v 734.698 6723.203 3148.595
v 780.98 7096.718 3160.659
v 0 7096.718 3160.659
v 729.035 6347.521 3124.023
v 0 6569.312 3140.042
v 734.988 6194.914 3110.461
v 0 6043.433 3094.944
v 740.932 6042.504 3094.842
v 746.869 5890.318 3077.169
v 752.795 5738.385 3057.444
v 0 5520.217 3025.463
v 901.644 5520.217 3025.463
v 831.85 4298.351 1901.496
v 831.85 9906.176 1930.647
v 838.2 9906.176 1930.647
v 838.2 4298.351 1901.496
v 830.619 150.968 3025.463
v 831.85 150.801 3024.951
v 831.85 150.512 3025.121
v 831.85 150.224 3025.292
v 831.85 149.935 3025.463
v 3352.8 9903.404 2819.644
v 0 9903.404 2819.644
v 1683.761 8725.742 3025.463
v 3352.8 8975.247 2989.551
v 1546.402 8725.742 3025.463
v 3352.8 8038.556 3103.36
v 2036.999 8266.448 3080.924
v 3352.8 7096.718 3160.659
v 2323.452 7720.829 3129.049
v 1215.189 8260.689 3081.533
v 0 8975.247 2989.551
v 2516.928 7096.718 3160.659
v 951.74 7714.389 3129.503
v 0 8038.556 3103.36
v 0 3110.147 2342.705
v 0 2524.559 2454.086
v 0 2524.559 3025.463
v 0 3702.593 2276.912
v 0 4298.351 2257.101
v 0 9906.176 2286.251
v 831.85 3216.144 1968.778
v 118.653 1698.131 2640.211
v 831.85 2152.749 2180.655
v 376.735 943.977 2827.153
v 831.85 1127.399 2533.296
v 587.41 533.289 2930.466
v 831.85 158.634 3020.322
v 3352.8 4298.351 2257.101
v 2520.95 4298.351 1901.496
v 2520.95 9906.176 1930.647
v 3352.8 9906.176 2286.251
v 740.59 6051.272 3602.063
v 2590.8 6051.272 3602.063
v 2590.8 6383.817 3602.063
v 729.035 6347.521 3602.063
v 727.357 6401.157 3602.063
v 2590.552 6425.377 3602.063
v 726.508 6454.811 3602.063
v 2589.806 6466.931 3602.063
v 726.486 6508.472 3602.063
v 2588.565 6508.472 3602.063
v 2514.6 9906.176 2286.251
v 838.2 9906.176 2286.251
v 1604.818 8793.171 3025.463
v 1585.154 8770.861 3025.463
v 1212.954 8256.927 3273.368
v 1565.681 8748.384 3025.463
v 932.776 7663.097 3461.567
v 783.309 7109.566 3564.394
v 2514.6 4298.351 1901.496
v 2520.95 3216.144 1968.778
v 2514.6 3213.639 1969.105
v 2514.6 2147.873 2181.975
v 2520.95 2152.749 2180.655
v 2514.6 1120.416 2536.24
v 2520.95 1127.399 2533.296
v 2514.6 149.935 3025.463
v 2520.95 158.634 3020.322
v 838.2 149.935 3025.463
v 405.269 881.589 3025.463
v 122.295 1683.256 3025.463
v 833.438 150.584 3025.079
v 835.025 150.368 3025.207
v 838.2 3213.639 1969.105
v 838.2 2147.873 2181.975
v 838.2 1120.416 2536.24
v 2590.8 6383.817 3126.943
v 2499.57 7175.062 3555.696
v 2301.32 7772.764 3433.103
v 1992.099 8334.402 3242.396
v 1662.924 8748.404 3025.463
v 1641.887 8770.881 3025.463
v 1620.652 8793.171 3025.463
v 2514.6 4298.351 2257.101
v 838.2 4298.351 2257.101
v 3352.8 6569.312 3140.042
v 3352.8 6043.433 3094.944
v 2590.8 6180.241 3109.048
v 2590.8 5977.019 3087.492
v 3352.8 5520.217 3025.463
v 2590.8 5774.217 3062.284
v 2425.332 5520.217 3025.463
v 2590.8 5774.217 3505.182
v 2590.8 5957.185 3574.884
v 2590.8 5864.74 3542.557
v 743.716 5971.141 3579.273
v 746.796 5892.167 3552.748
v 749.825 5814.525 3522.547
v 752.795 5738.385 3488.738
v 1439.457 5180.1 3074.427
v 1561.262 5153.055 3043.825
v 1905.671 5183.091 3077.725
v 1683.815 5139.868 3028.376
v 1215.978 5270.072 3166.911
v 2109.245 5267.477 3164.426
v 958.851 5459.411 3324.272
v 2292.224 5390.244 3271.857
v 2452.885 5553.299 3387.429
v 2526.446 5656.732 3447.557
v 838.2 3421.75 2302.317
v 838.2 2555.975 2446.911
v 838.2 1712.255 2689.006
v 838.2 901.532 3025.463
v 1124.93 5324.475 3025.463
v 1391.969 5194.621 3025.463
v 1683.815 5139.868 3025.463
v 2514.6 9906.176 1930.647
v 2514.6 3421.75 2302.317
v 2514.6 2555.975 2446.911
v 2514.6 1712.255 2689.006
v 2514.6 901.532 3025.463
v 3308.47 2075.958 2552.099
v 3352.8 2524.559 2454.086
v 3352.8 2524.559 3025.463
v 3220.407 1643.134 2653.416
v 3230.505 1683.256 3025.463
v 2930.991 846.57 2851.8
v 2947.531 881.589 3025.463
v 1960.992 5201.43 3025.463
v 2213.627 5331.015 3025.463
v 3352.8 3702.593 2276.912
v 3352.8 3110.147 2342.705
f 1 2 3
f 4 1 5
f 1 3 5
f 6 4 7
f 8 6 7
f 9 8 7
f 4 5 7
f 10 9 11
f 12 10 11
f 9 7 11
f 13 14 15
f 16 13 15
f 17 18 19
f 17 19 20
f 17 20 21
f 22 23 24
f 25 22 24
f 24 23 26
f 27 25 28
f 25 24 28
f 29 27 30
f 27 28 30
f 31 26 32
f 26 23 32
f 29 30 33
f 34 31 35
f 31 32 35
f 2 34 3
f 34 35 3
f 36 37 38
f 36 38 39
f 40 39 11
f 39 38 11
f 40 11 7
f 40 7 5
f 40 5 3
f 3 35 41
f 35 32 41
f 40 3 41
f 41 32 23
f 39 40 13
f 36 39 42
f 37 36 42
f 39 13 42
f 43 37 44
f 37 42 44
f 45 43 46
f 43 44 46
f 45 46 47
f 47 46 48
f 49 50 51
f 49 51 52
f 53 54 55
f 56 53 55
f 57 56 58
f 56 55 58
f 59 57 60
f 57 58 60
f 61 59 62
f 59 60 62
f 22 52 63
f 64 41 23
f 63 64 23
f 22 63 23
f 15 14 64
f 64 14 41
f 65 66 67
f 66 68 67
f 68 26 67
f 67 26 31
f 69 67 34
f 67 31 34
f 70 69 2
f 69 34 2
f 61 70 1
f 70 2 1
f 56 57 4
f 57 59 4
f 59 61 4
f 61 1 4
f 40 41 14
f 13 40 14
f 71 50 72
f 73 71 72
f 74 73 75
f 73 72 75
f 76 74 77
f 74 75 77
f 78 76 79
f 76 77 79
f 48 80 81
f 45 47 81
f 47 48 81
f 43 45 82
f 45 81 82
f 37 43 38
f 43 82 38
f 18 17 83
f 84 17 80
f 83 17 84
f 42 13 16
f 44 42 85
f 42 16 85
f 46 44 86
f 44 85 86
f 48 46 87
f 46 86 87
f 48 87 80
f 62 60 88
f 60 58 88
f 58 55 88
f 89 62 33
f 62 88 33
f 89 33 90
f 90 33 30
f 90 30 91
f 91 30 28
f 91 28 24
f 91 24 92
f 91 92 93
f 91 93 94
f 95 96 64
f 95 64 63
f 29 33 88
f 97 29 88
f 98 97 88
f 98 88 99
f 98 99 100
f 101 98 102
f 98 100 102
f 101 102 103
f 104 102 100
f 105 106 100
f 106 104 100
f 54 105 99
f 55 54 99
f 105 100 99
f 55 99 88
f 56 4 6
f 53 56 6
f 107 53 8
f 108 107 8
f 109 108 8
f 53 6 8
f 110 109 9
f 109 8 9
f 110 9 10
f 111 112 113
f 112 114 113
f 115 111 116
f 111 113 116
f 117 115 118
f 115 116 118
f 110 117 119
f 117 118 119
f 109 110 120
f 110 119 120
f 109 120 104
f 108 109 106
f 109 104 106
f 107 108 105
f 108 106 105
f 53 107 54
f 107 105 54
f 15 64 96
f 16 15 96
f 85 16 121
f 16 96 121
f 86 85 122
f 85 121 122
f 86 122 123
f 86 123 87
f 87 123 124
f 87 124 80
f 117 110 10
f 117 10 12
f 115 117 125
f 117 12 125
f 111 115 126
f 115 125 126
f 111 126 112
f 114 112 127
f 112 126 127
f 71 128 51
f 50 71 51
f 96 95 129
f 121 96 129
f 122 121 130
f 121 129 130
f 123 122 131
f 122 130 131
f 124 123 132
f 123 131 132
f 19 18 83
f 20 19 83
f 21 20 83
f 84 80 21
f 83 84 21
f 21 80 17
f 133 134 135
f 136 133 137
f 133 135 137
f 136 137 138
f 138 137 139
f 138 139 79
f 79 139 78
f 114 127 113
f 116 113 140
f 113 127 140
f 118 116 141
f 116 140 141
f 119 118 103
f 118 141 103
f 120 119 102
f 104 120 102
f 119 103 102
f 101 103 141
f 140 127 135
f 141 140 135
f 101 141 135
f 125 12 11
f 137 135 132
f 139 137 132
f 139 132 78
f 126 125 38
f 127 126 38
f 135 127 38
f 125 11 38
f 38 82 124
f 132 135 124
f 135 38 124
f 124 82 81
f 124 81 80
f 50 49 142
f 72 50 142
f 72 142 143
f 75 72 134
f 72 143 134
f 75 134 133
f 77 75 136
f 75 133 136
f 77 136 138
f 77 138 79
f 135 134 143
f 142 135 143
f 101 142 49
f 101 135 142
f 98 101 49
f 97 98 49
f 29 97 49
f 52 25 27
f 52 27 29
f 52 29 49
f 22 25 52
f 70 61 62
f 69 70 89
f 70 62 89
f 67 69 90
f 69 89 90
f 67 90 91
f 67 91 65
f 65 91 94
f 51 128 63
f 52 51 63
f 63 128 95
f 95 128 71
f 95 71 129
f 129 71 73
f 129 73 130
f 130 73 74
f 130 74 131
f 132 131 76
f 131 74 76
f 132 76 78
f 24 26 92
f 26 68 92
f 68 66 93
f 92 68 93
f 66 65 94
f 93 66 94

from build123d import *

# Parameters (mm, degrees)
F1_DEPTH  = 3352.8
F3_DEPTH  = 914.4
F5_DEPTH  = 3352.8
F7_W      = 1676.4
F7_H      = 187.770880038
F7_H_2    = 355.604804315
F10_DEPTH = 1320.8


with BuildPart() as f1:
    # F0 (on Right) → F1 (new body)
    with BuildSketch(Plane.YZ):
        with BuildLine():
            Line((9906.1763013826, 2286.2513795817), (9903.4036295408, 2819.6441732065))
            ThreePointArc((9903.4036295408, 2819.6441732065), (8507.7575621146, 3053.498500359), (7096.718104665, 3160.6593204871))
            ThreePointArc((7096.718104665, 3160.6593204871), (6306.1105449526, 3120.5478052313), (5520.2173816261, 3025.4626698664))
            Line((5520.2173816261, 3025.4626698664), (149.9354032589, 3025.4626698664))
            ThreePointArc((149.9354032589, 3025.4626698664), (2186.9166194611, 2445.3700036504), (4296.5021474202, 2257.0912826433))
            Line((4296.5021474202, 2257.0912826433), (9906.1763013826, 2286.2513795817))
        make_face()
        with BuildLine():
            Line((9906.1763013826, 1930.6465752666), (9906.1763013826, 2286.2513795817))
            Line((9906.1763013826, 2286.2513795817), (4296.5021474202, 2257.0912826433))
            ThreePointArc((4296.5021474202, 2257.0912826433), (2186.9166194611, 2445.3700036504), (149.9354032589, 3025.4626698664))
            ThreePointArc((149.9354032589, 3025.4626698664), (2147.8725687033, 2181.9750901472), (4298.3505953147, 1901.4960868935))
            Line((4298.3505953147, 1901.4960868935), (9906.1763013826, 1930.6465752666))
        make_face()
    extrude(amount=F1_DEPTH)

    # F2 (on face) → F3 (join)
    with BuildSketch(Plane.XY.offset(3025.4626698664)):
        with BuildLine():
            ThreePointArc((1683.8150913295, 5139.8680466252), (2221.5916744575, 5336.534299223), (2590.8, 5774.2173816261))
            Line((2590.8, 5774.2173816261), (2590.8, 6383.8173816261))
            ThreePointArc((2590.8, 6383.8173816261), (2336.9387512428, 7687.9813910632), (1612.4259228504, 8801.700592041))
            ThreePointArc((1612.4259228504, 8801.700592041), (931.872095069, 7660.5889477995), (729.0350215534, 6347.5213871845))
            Line((729.0350215534, 6347.5213871845), (752.7948753911, 5738.3845968446))
            ThreePointArc((752.7948753911, 5738.3845968446), (1138.7818511996, 5315.4244063088), (1683.8150913295, 5139.8680466252))
        make_face()
    extrude(amount=F3_DEPTH)

    # F4 (on face) → F5 (cut)
    with BuildSketch(Plane.YZ.offset(3352.8)):
        with BuildLine():
            ThreePointArc((5137.4154090881, 3025.4626698664), (5549.4088046364, 3384.9807891534), (6051.2724639455, 3602.0630397775))
            Line((6051.2724639455, 3602.0630397775), (6508.4724639455, 3602.0630397775))
            ThreePointArc((6508.4724639455, 3602.0630397775), (7699.4079318865, 3452.4470342276), (8816.3271482832, 3012.8976036053))
            Line((8816.3271482832, 3012.8976036053), (8976.5672683716, 4052.9136657715))
            Line((8976.5672683716, 4052.9136657715), (5137.4154090881, 4052.9136657715))
            Line((5137.4154090881, 4052.9136657715), (5137.4154090881, 3025.4626698664))
        make_face()
    extrude(amount=-F5_DEPTH, mode=Mode.SUBTRACT)

    # F8: sweep along a path in F8_path
    with BuildLine(Plane(origin=(3352.8, 9906.1763013826, 1930.6465752666), x_dir=(0, 0, 1), z_dir=(1, 0, 0))) as f8_path:
        Line((0, 0), (-29.1504883732, 5607.8257060679))
        ThreePointArc((-29.1504883732, 5607.8257060679), (251.3285148806, 7758.3037326792), (1094.8160945997, 9756.2408981237))
    # F7 (on face) → F8 (sweep, cut)
    with BuildSketch(Plane(origin=(0, 9906.1763013826, 0), x_dir=(-1, 0, 0), z_dir=(0, 1, 0))):
        Polygon((-2520.95, 1930.6465752666), (-3352.8, 2286.2513795817), (-3352.8, 1930.6465752666), align=None)
        Polygon((-2514.6, 1742.8756952286), (-2514.6, 1930.6465752666), (-2520.95, 1930.6465752666), (-3352.8, 1930.6465752666), (-3352.8, 1742.8756952286), align=None)
        with Locations((-1676.4, 1836.7611352476)):
            Rectangle(F7_W, F7_H)
        Polygon((-831.85, 1930.6465752666), (-838.2, 1930.6465752666), (-838.2, 1742.8756952286), (192.50908494, 1742.8756952286), (381.6066980362, 2006.4663887024), (0, 2286.2513795817), (0, 1930.6465752666), align=None)
        Polygon((0, 1930.6465752666), (0, 2286.2513795817), (-831.85, 1930.6465752666), align=None)
        with Locations((-1676.4, 2108.4489774241)):
            Rectangle(F7_W, F7_H_2)
    sweep(path=f8_path.line, mode=Mode.SUBTRACT)

    # F9 (on face) → F10 (cut)
    with BuildSketch(Plane.XY.offset(3025.4626698664)):
        with BuildLine():
            ThreePointArc((0, 2524.5586190393), (-4.7947551509, 2729.1455643262), (0, 2933.732509613))
            Line((0, 2933.732509613), (-833.7602615356, 377.7640759945))
            Line((-833.7602615356, 377.7640759945), (830.6194482815, 150.9683626398))
            add(Edge.make_bspline(
                [(0, 901.5324430601), (41.2990684914, 860.9735825536), (82.7531470768, 820.7592729572), (124.3534648361, 780.8755615368), (166.0922333943, 741.3097367391), (249.3112654144, 663.2792388889), (290.7882589994, 624.8070025808), (332.386779466, 586.6219277036), (374.1008263909, 548.7136108018), (457.311819666, 473.8247323565), (498.8064651623, 436.8386233615), (540.4037012367, 400.1046584982), (582.0988058574, 363.6142038331), (665.0600262184, 291.6387661512), (706.3233958068, 256.1468967875), (747.673514319, 220.8758836415), (789.1066626784, 185.818597837), (830.6194482815, 150.9683626398)],
                knots=[0, 0, 0, 0, 0, 0, 0.2542407325, 0.2542407325, 0.2542407325, 0.2542407325, 0.505314854, 0.505314854, 0.505314854, 0.505314854, 0.7537635021, 0.7537635021, 0.7537635021, 0.7537635021, 0.9985488127, 0.9985488127, 0.9985488127, 0.9985488127, 0.9985488127, 0.9985488127], degree=5))
            Line((0, 901.5324430598), (0, 2524.5586190393))
        make_face()
        with BuildLine():
            ThreePointArc((838.2, 149.9354032589), (244.2280510065, 1275.5203057617), (0, 2524.5586190393))
            Line((0, 2524.5586190393), (0, 901.5324430598))
            add(Edge.make_bspline(
                [(0, 901.5324430601), (41.2990684914, 860.9735825536), (82.7531470768, 820.7592729572), (124.3534648361, 780.8755615368), (166.0922333943, 741.3097367391), (249.3112654144, 663.2792388889), (290.7882589994, 624.8070025808), (332.386779466, 586.6219277036), (374.1008263909, 548.7136108018), (457.311819666, 473.8247323565), (498.8064651623, 436.8386233615), (540.4037012367, 400.1046584982), (582.0988058574, 363.6142038331), (665.0600262184, 291.6387661512), (706.3233958068, 256.1468967875), (747.673514319, 220.8758836415), (789.1066626784, 185.818597837), (830.6194482815, 150.9683626398)],
                knots=[0, 0, 0, 0, 0, 0, 0.2542407325, 0.2542407325, 0.2542407325, 0.2542407325, 0.505314854, 0.505314854, 0.505314854, 0.505314854, 0.7537635021, 0.7537635021, 0.7537635021, 0.7537635021, 0.9985488127, 0.9985488127, 0.9985488127, 0.9985488127, 0.9985488127, 0.9985488127], degree=5))
            Line((830.6194482815, 150.9683626398), (838.2, 149.9354032589))
        make_face()
        with BuildLine():
            ThreePointArc((3352.8, 2524.5586190392), (3108.5719489935, 1275.5203057617), (2514.6, 149.9354032589))
            Line((2514.6, 149.9354032589), (2520.95, 149.9354032589))
            add(Edge.make_bspline(
                [(2520.95, 149.9354032589), (2562.7107893152, 184.9873072693), (2604.3910553646, 220.248604014), (2645.9873487862, 255.7260842272), (2687.4958862315, 291.4270008447), (2770.7011941431, 363.6142038335), (2812.3962987638, 400.1046584985), (2853.9935348381, 436.8386233618), (2895.4881803343, 473.8247323568), (2978.6991736092, 548.7136108019), (3020.4132205339, 586.6219277035), (3062.0117410005, 624.8070025807), (3103.4887345854, 663.2792388887), (3186.7077666055, 741.3097367389), (3228.4465351637, 780.8755615366), (3270.0468529231, 820.7592729571), (3311.5009315086, 860.9735825535), (3352.8, 901.5324430601)],
                knots=[0, 0, 0, 0, 0, 0, 0.2462364979, 0.2462364979, 0.2462364979, 0.2462364979, 0.494685146, 0.494685146, 0.494685146, 0.494685146, 0.7457592675, 0.7457592675, 0.7457592675, 0.7457592675, 1, 1, 1, 1, 1, 1], degree=5))
            Line((3352.8, 901.5324430598), (3352.8, 2524.5586190392))
        make_face()
        with BuildLine():
            ThreePointArc((3352.8, 2933.732509613), (3357.5947551509, 2729.1455643261), (3352.8, 2524.5586190392))
            Line((3352.8, 2524.5586190392), (3352.8, 901.5324430598))
            add(Edge.make_bspline(
                [(2520.95, 149.9354032589), (2562.7107893152, 184.9873072693), (2604.3910553646, 220.248604014), (2645.9873487862, 255.7260842272), (2687.4958862315, 291.4270008447), (2770.7011941431, 363.6142038335), (2812.3962987638, 400.1046584985), (2853.9935348381, 436.8386233618), (2895.4881803343, 473.8247323568), (2978.6991736092, 548.7136108019), (3020.4132205339, 586.6219277035), (3062.0117410005, 624.8070025807), (3103.4887345854, 663.2792388887), (3186.7077666055, 741.3097367389), (3228.4465351637, 780.8755615366), (3270.0468529231, 820.7592729571), (3311.5009315086, 860.9735825535), (3352.8, 901.5324430601)],
                knots=[0, 0, 0, 0, 0, 0, 0.2462364979, 0.2462364979, 0.2462364979, 0.2462364979, 0.494685146, 0.494685146, 0.494685146, 0.494685146, 0.7457592675, 0.7457592675, 0.7457592675, 0.7457592675, 1, 1, 1, 1, 1, 1], degree=5))
            Line((2520.95, 149.9354032589), (4820.351600647, 149.9354032589))
            Line((4820.351600647, 149.9354032589), (3352.8, 2933.732509613))
        make_face()
    extrude(amount=-F10_DEPTH, mode=Mode.SUBTRACT)


solid = f1.part
